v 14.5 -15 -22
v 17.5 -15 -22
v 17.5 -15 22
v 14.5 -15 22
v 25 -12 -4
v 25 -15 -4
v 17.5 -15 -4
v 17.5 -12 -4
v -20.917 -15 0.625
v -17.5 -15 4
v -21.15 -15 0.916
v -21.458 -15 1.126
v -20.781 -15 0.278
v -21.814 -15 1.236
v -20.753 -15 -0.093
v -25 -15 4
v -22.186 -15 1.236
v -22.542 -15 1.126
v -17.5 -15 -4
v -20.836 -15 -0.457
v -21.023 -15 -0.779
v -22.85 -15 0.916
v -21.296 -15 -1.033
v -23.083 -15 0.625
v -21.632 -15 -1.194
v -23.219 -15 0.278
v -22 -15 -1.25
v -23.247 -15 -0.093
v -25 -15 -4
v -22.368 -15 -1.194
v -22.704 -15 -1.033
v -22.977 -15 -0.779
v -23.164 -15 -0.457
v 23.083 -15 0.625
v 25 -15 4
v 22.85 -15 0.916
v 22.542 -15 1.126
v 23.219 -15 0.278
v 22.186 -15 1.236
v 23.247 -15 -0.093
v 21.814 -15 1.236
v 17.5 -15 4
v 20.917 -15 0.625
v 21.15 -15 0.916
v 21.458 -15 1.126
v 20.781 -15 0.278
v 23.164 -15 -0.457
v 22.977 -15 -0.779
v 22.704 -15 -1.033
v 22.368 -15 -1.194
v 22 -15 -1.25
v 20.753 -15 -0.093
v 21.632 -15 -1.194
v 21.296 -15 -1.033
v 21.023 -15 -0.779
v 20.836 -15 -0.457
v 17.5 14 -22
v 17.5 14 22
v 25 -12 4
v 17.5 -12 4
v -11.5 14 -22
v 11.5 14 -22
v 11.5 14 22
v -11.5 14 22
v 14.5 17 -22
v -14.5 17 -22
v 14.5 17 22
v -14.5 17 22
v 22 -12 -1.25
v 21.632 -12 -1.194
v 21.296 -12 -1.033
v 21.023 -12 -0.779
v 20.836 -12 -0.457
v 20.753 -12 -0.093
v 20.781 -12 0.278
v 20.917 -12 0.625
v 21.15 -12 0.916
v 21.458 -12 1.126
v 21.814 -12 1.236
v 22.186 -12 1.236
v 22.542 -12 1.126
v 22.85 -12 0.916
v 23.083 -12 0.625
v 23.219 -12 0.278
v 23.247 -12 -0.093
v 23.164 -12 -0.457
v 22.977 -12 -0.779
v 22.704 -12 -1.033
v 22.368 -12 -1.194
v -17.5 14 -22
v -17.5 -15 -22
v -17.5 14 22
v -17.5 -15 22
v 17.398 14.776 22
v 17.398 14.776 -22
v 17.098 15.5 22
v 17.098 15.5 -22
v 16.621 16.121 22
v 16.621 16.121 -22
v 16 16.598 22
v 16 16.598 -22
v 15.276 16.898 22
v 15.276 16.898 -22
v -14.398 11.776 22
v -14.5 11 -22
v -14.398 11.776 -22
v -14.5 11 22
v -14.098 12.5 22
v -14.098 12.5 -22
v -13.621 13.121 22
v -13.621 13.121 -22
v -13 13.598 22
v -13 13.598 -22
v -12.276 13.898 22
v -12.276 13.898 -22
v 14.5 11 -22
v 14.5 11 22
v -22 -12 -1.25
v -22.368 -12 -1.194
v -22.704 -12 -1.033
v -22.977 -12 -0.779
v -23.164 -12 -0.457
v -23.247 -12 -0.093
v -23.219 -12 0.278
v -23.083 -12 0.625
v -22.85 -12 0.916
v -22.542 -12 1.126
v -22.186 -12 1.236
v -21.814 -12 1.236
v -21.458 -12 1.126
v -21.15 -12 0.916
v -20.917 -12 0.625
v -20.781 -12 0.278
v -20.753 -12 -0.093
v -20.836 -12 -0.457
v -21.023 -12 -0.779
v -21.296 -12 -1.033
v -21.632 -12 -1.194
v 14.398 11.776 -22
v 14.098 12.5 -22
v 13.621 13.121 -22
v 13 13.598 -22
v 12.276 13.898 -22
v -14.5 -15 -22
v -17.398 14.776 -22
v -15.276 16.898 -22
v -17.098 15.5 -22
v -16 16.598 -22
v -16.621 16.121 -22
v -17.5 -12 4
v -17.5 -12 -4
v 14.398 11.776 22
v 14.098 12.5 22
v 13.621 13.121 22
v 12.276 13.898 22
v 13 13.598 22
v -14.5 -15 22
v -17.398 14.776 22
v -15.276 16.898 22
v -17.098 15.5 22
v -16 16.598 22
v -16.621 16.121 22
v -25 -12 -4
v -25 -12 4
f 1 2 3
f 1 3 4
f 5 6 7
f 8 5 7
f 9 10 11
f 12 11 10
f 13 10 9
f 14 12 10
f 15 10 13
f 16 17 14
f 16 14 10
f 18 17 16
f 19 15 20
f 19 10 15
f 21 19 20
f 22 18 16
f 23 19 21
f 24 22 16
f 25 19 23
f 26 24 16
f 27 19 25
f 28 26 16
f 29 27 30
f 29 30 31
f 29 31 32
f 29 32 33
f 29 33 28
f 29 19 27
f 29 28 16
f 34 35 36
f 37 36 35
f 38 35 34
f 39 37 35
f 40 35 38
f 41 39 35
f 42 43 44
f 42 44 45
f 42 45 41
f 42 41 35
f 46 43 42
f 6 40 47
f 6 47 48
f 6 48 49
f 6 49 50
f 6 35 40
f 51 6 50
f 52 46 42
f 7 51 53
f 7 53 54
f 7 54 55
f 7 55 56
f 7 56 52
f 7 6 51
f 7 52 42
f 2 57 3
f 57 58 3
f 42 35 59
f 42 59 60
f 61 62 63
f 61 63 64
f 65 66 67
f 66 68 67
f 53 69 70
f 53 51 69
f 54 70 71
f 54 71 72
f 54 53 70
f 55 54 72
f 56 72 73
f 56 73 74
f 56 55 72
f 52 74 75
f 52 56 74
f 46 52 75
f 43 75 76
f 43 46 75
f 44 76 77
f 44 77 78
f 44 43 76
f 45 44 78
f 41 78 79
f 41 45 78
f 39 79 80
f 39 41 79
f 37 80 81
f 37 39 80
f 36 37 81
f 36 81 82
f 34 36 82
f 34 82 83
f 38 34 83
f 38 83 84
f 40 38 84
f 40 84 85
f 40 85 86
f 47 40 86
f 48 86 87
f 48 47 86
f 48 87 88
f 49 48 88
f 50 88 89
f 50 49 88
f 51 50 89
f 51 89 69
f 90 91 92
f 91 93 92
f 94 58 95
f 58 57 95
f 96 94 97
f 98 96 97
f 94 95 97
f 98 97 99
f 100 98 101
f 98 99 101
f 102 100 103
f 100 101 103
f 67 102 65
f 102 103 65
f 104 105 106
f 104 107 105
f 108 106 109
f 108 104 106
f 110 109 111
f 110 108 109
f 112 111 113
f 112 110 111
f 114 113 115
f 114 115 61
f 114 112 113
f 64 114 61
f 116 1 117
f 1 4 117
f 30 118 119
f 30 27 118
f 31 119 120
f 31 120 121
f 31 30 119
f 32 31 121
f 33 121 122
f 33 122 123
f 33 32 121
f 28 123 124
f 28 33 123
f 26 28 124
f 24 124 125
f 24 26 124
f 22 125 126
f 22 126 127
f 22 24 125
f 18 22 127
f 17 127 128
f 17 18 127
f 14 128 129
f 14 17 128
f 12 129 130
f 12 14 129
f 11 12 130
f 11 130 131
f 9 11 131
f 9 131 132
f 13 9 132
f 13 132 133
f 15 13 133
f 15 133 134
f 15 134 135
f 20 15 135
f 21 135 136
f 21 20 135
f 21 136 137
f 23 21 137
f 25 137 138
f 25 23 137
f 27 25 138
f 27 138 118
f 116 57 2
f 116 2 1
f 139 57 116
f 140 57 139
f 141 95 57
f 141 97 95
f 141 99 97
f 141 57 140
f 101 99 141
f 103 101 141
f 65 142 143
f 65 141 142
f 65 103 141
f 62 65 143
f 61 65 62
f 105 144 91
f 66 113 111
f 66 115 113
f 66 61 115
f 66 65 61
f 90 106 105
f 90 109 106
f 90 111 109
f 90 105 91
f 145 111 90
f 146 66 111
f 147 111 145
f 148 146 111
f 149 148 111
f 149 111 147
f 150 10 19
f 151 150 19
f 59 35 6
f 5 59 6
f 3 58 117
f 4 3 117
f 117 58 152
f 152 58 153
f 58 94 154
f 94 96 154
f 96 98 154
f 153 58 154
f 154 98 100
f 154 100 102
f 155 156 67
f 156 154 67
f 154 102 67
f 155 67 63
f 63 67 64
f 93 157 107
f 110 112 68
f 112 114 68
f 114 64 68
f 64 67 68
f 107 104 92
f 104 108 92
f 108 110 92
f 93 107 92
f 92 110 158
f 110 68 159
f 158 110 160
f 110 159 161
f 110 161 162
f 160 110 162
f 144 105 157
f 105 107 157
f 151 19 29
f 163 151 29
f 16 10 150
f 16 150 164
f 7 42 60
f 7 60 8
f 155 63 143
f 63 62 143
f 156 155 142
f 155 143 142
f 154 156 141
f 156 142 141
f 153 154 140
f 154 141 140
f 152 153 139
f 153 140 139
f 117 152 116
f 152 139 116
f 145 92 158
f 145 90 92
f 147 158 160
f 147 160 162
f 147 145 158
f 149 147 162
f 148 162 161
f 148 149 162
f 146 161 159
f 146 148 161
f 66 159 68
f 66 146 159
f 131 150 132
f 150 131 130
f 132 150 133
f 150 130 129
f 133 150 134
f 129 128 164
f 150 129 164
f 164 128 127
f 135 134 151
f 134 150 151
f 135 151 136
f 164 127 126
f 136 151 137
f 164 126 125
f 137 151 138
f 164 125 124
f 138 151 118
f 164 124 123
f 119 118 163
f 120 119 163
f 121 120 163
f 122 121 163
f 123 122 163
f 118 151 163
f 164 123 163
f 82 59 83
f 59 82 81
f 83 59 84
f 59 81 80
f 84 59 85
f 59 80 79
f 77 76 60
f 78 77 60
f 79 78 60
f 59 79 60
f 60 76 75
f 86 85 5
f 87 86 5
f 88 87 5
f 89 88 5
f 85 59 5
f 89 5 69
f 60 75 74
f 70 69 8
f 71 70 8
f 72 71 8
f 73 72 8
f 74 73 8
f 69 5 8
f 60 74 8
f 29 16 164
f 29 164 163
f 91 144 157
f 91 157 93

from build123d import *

# Parameters (mm, degrees)
BOSS_EXTRUDE1_DEPTH            = 22
SKETCH2_W                      = 7.5
SKETCH2_H                      = 8
SKETCH2_R                      = 0.5
BOSS_EXTRUDE2_DEPTH            = 3
BOSS_EXTRUDE2_2_DEPTH          = 3
FILLET1_R                      = 3
M3X0_5_TAPPED_HOLE1_AT_2_COUNT = 2
M3X0_5_TAPPED_HOLE1_AT_2_PITCH = 44


with BuildPart() as part:
    # Sketch1 → Boss-Extrude1 (new, symmetric)
    with BuildSketch(Plane.XY):
        Polygon((-17.5, -15), (-17.5, 17), (17.5, 17), (17.5, -15), (14.5, -15), (14.5, 14), (-14.5, 14), (-14.5, -15), align=None)
    extrude(amount=BOSS_EXTRUDE1_DEPTH, both=True)

    # Fillet1
    fillet1_edges = [part.edges().sort_by_distance(p)[0] for p in [
        (14.5, 14, 0),
        (-14.5, 14, 0),
        (-17.5, 17, 0),
        (17.5, 17, 0),
    ]]
    fillet(fillet1_edges, radius=FILLET1_R)


with BuildPart() as body_2:
    # Sketch2 → Boss-Extrude2 (new body)
    with BuildSketch(Plane(origin=(0, -15, 0), x_dir=(-1, 0, 0), z_dir=(0, -1, 0))):
        with Locations((-21.25, 0)):
            Rectangle(SKETCH2_W, SKETCH2_H)
        with Locations(Location((-22, 0, 0), (0, 0, 90))):
            Circle(SKETCH2_R, mode=Mode.SUBTRACT)
    extrude(amount=-BOSS_EXTRUDE2_DEPTH)


with BuildPart() as body_3:
    # Sketch2 → Boss-Extrude2 2 (new body)
    with BuildSketch(Plane(origin=(0, -15, 0), x_dir=(-1, 0, 0), z_dir=(0, -1, 0))):
        with Locations((21.25, 0)):
            Rectangle(SKETCH2_W, SKETCH2_H)
        with Locations(Location((22, 0, 0), (0, 0, 270))):
            Circle(SKETCH2_R, mode=Mode.SUBTRACT)
    extrude(amount=-BOSS_EXTRUDE2_2_DEPTH)

    # Sketch5 → M3x0.5 Tapped Hole1 (revolve, cut)
    with BuildSketch(Plane(origin=(-22, -15, 0), x_dir=(0, 0, -1), z_dir=(1, 0, 0))):
        Polygon((0, 0), (0, 3.751075774), (1.25, 3), (1.25, 0), align=None)
    m3x0_5_tapped_hole1 = revolve(axis=Axis((-22, -21.35, 0), (0, 1, 0)), mode=Mode.SUBTRACT)


with BuildPart() as body_2_1:
    add(body_2.part)

    # M3x0.5 Tapped Hole1 at 2: M3x0.5 Tapped Hole1 ×2
    with Locations(*[(i * M3X0_5_TAPPED_HOLE1_AT_2_PITCH, 0, 0) for i in range(1, M3X0_5_TAPPED_HOLE1_AT_2_COUNT)]):
        add(m3x0_5_tapped_hole1, mode=Mode.SUBTRACT)


solid = Compound([part.part, body_3.part, body_2_1.part])
